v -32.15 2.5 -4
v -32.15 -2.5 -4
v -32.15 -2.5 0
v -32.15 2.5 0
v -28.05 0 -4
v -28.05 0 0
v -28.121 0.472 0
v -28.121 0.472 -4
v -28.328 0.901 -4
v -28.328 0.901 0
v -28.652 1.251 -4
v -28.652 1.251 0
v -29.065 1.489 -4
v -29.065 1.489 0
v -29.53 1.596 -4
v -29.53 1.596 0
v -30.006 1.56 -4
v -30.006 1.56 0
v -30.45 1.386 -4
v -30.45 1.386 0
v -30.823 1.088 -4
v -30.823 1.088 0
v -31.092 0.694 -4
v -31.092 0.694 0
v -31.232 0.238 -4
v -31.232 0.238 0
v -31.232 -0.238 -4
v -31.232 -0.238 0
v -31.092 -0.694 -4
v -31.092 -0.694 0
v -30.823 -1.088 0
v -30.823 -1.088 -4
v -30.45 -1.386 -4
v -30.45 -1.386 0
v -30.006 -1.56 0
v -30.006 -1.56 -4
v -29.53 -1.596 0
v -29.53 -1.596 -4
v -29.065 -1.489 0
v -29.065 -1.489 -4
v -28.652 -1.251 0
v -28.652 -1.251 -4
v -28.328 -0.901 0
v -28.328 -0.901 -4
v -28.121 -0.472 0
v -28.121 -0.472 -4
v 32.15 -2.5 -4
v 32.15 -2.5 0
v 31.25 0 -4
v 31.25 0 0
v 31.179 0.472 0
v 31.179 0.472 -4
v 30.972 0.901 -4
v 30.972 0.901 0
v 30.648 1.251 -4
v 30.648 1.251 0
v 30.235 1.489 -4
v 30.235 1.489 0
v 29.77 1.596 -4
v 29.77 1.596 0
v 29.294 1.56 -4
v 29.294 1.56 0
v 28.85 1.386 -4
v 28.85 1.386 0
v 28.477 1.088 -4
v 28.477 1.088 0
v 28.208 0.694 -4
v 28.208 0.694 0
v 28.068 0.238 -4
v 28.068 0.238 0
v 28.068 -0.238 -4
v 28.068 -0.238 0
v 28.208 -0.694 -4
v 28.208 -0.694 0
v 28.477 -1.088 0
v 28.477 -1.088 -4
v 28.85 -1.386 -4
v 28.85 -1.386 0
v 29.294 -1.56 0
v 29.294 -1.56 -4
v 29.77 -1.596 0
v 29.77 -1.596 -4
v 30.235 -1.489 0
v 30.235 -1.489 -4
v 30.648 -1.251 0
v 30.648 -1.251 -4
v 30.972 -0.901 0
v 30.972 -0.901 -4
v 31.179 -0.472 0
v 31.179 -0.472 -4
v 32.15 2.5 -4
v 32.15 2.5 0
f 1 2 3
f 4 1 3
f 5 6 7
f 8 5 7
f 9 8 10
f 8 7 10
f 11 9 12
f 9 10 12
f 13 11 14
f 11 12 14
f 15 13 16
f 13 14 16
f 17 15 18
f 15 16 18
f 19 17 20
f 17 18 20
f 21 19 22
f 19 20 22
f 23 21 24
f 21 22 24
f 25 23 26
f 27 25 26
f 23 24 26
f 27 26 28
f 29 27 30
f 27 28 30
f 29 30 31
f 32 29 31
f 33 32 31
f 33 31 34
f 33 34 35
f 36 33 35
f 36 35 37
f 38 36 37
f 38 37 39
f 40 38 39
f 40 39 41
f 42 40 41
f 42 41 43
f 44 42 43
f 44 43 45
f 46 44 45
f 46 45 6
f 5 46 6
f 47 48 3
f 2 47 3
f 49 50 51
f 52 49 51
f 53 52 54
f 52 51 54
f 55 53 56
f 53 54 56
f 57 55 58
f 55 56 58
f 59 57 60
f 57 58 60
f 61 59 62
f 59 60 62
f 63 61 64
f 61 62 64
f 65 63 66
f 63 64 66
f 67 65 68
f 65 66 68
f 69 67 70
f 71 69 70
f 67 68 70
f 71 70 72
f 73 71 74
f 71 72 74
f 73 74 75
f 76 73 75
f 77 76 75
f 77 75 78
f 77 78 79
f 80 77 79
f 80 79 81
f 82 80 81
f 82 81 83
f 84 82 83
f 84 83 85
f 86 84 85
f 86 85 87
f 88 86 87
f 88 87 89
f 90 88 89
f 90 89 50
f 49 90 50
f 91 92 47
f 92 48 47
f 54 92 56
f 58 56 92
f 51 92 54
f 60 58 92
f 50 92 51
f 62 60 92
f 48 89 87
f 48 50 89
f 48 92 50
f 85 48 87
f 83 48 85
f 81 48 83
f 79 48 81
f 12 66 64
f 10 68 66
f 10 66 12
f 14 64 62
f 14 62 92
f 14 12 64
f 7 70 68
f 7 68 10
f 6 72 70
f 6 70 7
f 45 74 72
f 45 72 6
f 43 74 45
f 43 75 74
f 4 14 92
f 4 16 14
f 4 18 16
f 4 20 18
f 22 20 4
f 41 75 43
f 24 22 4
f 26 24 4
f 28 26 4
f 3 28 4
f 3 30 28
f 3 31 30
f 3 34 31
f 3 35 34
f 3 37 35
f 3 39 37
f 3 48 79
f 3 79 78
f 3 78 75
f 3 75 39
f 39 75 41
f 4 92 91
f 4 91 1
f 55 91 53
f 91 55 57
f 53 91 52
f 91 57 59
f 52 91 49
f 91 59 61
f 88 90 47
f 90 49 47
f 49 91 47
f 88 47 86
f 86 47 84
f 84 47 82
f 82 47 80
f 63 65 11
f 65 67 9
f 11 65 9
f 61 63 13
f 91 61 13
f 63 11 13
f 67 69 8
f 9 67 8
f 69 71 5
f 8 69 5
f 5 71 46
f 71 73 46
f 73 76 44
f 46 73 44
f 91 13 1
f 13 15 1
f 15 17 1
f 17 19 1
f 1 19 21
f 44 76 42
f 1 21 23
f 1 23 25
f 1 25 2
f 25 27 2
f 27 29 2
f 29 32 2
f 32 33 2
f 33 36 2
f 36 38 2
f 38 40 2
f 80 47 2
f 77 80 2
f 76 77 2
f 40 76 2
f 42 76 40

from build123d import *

# Parameters (mm, degrees)
PAD_DEPTH       = 2.5
SKETCH002_R     = 1.6
POCKET001_DEPTH = 4.001


with BuildPart() as part:
    # Sketch → Pad (new body, symmetric)
    with BuildSketch(Plane.XZ):
        Polygon((-27.15, 0), (27.15, 0), (32.15, 0), (32.15, -4), (-32.15, -4), (-32.15, 0), align=None)
    extrude(amount=PAD_DEPTH, both=True)

    # Sketch002 → Pocket001 (cut, through all)
    with BuildSketch(Plane.XY):
        with Locations((29.65, 0)):
            Circle(SKETCH002_R)
        with Locations((-29.65, 0)):
            Circle(SKETCH002_R)
    extrude(amount=-POCKET001_DEPTH, mode=Mode.SUBTRACT)


solid = part.part
